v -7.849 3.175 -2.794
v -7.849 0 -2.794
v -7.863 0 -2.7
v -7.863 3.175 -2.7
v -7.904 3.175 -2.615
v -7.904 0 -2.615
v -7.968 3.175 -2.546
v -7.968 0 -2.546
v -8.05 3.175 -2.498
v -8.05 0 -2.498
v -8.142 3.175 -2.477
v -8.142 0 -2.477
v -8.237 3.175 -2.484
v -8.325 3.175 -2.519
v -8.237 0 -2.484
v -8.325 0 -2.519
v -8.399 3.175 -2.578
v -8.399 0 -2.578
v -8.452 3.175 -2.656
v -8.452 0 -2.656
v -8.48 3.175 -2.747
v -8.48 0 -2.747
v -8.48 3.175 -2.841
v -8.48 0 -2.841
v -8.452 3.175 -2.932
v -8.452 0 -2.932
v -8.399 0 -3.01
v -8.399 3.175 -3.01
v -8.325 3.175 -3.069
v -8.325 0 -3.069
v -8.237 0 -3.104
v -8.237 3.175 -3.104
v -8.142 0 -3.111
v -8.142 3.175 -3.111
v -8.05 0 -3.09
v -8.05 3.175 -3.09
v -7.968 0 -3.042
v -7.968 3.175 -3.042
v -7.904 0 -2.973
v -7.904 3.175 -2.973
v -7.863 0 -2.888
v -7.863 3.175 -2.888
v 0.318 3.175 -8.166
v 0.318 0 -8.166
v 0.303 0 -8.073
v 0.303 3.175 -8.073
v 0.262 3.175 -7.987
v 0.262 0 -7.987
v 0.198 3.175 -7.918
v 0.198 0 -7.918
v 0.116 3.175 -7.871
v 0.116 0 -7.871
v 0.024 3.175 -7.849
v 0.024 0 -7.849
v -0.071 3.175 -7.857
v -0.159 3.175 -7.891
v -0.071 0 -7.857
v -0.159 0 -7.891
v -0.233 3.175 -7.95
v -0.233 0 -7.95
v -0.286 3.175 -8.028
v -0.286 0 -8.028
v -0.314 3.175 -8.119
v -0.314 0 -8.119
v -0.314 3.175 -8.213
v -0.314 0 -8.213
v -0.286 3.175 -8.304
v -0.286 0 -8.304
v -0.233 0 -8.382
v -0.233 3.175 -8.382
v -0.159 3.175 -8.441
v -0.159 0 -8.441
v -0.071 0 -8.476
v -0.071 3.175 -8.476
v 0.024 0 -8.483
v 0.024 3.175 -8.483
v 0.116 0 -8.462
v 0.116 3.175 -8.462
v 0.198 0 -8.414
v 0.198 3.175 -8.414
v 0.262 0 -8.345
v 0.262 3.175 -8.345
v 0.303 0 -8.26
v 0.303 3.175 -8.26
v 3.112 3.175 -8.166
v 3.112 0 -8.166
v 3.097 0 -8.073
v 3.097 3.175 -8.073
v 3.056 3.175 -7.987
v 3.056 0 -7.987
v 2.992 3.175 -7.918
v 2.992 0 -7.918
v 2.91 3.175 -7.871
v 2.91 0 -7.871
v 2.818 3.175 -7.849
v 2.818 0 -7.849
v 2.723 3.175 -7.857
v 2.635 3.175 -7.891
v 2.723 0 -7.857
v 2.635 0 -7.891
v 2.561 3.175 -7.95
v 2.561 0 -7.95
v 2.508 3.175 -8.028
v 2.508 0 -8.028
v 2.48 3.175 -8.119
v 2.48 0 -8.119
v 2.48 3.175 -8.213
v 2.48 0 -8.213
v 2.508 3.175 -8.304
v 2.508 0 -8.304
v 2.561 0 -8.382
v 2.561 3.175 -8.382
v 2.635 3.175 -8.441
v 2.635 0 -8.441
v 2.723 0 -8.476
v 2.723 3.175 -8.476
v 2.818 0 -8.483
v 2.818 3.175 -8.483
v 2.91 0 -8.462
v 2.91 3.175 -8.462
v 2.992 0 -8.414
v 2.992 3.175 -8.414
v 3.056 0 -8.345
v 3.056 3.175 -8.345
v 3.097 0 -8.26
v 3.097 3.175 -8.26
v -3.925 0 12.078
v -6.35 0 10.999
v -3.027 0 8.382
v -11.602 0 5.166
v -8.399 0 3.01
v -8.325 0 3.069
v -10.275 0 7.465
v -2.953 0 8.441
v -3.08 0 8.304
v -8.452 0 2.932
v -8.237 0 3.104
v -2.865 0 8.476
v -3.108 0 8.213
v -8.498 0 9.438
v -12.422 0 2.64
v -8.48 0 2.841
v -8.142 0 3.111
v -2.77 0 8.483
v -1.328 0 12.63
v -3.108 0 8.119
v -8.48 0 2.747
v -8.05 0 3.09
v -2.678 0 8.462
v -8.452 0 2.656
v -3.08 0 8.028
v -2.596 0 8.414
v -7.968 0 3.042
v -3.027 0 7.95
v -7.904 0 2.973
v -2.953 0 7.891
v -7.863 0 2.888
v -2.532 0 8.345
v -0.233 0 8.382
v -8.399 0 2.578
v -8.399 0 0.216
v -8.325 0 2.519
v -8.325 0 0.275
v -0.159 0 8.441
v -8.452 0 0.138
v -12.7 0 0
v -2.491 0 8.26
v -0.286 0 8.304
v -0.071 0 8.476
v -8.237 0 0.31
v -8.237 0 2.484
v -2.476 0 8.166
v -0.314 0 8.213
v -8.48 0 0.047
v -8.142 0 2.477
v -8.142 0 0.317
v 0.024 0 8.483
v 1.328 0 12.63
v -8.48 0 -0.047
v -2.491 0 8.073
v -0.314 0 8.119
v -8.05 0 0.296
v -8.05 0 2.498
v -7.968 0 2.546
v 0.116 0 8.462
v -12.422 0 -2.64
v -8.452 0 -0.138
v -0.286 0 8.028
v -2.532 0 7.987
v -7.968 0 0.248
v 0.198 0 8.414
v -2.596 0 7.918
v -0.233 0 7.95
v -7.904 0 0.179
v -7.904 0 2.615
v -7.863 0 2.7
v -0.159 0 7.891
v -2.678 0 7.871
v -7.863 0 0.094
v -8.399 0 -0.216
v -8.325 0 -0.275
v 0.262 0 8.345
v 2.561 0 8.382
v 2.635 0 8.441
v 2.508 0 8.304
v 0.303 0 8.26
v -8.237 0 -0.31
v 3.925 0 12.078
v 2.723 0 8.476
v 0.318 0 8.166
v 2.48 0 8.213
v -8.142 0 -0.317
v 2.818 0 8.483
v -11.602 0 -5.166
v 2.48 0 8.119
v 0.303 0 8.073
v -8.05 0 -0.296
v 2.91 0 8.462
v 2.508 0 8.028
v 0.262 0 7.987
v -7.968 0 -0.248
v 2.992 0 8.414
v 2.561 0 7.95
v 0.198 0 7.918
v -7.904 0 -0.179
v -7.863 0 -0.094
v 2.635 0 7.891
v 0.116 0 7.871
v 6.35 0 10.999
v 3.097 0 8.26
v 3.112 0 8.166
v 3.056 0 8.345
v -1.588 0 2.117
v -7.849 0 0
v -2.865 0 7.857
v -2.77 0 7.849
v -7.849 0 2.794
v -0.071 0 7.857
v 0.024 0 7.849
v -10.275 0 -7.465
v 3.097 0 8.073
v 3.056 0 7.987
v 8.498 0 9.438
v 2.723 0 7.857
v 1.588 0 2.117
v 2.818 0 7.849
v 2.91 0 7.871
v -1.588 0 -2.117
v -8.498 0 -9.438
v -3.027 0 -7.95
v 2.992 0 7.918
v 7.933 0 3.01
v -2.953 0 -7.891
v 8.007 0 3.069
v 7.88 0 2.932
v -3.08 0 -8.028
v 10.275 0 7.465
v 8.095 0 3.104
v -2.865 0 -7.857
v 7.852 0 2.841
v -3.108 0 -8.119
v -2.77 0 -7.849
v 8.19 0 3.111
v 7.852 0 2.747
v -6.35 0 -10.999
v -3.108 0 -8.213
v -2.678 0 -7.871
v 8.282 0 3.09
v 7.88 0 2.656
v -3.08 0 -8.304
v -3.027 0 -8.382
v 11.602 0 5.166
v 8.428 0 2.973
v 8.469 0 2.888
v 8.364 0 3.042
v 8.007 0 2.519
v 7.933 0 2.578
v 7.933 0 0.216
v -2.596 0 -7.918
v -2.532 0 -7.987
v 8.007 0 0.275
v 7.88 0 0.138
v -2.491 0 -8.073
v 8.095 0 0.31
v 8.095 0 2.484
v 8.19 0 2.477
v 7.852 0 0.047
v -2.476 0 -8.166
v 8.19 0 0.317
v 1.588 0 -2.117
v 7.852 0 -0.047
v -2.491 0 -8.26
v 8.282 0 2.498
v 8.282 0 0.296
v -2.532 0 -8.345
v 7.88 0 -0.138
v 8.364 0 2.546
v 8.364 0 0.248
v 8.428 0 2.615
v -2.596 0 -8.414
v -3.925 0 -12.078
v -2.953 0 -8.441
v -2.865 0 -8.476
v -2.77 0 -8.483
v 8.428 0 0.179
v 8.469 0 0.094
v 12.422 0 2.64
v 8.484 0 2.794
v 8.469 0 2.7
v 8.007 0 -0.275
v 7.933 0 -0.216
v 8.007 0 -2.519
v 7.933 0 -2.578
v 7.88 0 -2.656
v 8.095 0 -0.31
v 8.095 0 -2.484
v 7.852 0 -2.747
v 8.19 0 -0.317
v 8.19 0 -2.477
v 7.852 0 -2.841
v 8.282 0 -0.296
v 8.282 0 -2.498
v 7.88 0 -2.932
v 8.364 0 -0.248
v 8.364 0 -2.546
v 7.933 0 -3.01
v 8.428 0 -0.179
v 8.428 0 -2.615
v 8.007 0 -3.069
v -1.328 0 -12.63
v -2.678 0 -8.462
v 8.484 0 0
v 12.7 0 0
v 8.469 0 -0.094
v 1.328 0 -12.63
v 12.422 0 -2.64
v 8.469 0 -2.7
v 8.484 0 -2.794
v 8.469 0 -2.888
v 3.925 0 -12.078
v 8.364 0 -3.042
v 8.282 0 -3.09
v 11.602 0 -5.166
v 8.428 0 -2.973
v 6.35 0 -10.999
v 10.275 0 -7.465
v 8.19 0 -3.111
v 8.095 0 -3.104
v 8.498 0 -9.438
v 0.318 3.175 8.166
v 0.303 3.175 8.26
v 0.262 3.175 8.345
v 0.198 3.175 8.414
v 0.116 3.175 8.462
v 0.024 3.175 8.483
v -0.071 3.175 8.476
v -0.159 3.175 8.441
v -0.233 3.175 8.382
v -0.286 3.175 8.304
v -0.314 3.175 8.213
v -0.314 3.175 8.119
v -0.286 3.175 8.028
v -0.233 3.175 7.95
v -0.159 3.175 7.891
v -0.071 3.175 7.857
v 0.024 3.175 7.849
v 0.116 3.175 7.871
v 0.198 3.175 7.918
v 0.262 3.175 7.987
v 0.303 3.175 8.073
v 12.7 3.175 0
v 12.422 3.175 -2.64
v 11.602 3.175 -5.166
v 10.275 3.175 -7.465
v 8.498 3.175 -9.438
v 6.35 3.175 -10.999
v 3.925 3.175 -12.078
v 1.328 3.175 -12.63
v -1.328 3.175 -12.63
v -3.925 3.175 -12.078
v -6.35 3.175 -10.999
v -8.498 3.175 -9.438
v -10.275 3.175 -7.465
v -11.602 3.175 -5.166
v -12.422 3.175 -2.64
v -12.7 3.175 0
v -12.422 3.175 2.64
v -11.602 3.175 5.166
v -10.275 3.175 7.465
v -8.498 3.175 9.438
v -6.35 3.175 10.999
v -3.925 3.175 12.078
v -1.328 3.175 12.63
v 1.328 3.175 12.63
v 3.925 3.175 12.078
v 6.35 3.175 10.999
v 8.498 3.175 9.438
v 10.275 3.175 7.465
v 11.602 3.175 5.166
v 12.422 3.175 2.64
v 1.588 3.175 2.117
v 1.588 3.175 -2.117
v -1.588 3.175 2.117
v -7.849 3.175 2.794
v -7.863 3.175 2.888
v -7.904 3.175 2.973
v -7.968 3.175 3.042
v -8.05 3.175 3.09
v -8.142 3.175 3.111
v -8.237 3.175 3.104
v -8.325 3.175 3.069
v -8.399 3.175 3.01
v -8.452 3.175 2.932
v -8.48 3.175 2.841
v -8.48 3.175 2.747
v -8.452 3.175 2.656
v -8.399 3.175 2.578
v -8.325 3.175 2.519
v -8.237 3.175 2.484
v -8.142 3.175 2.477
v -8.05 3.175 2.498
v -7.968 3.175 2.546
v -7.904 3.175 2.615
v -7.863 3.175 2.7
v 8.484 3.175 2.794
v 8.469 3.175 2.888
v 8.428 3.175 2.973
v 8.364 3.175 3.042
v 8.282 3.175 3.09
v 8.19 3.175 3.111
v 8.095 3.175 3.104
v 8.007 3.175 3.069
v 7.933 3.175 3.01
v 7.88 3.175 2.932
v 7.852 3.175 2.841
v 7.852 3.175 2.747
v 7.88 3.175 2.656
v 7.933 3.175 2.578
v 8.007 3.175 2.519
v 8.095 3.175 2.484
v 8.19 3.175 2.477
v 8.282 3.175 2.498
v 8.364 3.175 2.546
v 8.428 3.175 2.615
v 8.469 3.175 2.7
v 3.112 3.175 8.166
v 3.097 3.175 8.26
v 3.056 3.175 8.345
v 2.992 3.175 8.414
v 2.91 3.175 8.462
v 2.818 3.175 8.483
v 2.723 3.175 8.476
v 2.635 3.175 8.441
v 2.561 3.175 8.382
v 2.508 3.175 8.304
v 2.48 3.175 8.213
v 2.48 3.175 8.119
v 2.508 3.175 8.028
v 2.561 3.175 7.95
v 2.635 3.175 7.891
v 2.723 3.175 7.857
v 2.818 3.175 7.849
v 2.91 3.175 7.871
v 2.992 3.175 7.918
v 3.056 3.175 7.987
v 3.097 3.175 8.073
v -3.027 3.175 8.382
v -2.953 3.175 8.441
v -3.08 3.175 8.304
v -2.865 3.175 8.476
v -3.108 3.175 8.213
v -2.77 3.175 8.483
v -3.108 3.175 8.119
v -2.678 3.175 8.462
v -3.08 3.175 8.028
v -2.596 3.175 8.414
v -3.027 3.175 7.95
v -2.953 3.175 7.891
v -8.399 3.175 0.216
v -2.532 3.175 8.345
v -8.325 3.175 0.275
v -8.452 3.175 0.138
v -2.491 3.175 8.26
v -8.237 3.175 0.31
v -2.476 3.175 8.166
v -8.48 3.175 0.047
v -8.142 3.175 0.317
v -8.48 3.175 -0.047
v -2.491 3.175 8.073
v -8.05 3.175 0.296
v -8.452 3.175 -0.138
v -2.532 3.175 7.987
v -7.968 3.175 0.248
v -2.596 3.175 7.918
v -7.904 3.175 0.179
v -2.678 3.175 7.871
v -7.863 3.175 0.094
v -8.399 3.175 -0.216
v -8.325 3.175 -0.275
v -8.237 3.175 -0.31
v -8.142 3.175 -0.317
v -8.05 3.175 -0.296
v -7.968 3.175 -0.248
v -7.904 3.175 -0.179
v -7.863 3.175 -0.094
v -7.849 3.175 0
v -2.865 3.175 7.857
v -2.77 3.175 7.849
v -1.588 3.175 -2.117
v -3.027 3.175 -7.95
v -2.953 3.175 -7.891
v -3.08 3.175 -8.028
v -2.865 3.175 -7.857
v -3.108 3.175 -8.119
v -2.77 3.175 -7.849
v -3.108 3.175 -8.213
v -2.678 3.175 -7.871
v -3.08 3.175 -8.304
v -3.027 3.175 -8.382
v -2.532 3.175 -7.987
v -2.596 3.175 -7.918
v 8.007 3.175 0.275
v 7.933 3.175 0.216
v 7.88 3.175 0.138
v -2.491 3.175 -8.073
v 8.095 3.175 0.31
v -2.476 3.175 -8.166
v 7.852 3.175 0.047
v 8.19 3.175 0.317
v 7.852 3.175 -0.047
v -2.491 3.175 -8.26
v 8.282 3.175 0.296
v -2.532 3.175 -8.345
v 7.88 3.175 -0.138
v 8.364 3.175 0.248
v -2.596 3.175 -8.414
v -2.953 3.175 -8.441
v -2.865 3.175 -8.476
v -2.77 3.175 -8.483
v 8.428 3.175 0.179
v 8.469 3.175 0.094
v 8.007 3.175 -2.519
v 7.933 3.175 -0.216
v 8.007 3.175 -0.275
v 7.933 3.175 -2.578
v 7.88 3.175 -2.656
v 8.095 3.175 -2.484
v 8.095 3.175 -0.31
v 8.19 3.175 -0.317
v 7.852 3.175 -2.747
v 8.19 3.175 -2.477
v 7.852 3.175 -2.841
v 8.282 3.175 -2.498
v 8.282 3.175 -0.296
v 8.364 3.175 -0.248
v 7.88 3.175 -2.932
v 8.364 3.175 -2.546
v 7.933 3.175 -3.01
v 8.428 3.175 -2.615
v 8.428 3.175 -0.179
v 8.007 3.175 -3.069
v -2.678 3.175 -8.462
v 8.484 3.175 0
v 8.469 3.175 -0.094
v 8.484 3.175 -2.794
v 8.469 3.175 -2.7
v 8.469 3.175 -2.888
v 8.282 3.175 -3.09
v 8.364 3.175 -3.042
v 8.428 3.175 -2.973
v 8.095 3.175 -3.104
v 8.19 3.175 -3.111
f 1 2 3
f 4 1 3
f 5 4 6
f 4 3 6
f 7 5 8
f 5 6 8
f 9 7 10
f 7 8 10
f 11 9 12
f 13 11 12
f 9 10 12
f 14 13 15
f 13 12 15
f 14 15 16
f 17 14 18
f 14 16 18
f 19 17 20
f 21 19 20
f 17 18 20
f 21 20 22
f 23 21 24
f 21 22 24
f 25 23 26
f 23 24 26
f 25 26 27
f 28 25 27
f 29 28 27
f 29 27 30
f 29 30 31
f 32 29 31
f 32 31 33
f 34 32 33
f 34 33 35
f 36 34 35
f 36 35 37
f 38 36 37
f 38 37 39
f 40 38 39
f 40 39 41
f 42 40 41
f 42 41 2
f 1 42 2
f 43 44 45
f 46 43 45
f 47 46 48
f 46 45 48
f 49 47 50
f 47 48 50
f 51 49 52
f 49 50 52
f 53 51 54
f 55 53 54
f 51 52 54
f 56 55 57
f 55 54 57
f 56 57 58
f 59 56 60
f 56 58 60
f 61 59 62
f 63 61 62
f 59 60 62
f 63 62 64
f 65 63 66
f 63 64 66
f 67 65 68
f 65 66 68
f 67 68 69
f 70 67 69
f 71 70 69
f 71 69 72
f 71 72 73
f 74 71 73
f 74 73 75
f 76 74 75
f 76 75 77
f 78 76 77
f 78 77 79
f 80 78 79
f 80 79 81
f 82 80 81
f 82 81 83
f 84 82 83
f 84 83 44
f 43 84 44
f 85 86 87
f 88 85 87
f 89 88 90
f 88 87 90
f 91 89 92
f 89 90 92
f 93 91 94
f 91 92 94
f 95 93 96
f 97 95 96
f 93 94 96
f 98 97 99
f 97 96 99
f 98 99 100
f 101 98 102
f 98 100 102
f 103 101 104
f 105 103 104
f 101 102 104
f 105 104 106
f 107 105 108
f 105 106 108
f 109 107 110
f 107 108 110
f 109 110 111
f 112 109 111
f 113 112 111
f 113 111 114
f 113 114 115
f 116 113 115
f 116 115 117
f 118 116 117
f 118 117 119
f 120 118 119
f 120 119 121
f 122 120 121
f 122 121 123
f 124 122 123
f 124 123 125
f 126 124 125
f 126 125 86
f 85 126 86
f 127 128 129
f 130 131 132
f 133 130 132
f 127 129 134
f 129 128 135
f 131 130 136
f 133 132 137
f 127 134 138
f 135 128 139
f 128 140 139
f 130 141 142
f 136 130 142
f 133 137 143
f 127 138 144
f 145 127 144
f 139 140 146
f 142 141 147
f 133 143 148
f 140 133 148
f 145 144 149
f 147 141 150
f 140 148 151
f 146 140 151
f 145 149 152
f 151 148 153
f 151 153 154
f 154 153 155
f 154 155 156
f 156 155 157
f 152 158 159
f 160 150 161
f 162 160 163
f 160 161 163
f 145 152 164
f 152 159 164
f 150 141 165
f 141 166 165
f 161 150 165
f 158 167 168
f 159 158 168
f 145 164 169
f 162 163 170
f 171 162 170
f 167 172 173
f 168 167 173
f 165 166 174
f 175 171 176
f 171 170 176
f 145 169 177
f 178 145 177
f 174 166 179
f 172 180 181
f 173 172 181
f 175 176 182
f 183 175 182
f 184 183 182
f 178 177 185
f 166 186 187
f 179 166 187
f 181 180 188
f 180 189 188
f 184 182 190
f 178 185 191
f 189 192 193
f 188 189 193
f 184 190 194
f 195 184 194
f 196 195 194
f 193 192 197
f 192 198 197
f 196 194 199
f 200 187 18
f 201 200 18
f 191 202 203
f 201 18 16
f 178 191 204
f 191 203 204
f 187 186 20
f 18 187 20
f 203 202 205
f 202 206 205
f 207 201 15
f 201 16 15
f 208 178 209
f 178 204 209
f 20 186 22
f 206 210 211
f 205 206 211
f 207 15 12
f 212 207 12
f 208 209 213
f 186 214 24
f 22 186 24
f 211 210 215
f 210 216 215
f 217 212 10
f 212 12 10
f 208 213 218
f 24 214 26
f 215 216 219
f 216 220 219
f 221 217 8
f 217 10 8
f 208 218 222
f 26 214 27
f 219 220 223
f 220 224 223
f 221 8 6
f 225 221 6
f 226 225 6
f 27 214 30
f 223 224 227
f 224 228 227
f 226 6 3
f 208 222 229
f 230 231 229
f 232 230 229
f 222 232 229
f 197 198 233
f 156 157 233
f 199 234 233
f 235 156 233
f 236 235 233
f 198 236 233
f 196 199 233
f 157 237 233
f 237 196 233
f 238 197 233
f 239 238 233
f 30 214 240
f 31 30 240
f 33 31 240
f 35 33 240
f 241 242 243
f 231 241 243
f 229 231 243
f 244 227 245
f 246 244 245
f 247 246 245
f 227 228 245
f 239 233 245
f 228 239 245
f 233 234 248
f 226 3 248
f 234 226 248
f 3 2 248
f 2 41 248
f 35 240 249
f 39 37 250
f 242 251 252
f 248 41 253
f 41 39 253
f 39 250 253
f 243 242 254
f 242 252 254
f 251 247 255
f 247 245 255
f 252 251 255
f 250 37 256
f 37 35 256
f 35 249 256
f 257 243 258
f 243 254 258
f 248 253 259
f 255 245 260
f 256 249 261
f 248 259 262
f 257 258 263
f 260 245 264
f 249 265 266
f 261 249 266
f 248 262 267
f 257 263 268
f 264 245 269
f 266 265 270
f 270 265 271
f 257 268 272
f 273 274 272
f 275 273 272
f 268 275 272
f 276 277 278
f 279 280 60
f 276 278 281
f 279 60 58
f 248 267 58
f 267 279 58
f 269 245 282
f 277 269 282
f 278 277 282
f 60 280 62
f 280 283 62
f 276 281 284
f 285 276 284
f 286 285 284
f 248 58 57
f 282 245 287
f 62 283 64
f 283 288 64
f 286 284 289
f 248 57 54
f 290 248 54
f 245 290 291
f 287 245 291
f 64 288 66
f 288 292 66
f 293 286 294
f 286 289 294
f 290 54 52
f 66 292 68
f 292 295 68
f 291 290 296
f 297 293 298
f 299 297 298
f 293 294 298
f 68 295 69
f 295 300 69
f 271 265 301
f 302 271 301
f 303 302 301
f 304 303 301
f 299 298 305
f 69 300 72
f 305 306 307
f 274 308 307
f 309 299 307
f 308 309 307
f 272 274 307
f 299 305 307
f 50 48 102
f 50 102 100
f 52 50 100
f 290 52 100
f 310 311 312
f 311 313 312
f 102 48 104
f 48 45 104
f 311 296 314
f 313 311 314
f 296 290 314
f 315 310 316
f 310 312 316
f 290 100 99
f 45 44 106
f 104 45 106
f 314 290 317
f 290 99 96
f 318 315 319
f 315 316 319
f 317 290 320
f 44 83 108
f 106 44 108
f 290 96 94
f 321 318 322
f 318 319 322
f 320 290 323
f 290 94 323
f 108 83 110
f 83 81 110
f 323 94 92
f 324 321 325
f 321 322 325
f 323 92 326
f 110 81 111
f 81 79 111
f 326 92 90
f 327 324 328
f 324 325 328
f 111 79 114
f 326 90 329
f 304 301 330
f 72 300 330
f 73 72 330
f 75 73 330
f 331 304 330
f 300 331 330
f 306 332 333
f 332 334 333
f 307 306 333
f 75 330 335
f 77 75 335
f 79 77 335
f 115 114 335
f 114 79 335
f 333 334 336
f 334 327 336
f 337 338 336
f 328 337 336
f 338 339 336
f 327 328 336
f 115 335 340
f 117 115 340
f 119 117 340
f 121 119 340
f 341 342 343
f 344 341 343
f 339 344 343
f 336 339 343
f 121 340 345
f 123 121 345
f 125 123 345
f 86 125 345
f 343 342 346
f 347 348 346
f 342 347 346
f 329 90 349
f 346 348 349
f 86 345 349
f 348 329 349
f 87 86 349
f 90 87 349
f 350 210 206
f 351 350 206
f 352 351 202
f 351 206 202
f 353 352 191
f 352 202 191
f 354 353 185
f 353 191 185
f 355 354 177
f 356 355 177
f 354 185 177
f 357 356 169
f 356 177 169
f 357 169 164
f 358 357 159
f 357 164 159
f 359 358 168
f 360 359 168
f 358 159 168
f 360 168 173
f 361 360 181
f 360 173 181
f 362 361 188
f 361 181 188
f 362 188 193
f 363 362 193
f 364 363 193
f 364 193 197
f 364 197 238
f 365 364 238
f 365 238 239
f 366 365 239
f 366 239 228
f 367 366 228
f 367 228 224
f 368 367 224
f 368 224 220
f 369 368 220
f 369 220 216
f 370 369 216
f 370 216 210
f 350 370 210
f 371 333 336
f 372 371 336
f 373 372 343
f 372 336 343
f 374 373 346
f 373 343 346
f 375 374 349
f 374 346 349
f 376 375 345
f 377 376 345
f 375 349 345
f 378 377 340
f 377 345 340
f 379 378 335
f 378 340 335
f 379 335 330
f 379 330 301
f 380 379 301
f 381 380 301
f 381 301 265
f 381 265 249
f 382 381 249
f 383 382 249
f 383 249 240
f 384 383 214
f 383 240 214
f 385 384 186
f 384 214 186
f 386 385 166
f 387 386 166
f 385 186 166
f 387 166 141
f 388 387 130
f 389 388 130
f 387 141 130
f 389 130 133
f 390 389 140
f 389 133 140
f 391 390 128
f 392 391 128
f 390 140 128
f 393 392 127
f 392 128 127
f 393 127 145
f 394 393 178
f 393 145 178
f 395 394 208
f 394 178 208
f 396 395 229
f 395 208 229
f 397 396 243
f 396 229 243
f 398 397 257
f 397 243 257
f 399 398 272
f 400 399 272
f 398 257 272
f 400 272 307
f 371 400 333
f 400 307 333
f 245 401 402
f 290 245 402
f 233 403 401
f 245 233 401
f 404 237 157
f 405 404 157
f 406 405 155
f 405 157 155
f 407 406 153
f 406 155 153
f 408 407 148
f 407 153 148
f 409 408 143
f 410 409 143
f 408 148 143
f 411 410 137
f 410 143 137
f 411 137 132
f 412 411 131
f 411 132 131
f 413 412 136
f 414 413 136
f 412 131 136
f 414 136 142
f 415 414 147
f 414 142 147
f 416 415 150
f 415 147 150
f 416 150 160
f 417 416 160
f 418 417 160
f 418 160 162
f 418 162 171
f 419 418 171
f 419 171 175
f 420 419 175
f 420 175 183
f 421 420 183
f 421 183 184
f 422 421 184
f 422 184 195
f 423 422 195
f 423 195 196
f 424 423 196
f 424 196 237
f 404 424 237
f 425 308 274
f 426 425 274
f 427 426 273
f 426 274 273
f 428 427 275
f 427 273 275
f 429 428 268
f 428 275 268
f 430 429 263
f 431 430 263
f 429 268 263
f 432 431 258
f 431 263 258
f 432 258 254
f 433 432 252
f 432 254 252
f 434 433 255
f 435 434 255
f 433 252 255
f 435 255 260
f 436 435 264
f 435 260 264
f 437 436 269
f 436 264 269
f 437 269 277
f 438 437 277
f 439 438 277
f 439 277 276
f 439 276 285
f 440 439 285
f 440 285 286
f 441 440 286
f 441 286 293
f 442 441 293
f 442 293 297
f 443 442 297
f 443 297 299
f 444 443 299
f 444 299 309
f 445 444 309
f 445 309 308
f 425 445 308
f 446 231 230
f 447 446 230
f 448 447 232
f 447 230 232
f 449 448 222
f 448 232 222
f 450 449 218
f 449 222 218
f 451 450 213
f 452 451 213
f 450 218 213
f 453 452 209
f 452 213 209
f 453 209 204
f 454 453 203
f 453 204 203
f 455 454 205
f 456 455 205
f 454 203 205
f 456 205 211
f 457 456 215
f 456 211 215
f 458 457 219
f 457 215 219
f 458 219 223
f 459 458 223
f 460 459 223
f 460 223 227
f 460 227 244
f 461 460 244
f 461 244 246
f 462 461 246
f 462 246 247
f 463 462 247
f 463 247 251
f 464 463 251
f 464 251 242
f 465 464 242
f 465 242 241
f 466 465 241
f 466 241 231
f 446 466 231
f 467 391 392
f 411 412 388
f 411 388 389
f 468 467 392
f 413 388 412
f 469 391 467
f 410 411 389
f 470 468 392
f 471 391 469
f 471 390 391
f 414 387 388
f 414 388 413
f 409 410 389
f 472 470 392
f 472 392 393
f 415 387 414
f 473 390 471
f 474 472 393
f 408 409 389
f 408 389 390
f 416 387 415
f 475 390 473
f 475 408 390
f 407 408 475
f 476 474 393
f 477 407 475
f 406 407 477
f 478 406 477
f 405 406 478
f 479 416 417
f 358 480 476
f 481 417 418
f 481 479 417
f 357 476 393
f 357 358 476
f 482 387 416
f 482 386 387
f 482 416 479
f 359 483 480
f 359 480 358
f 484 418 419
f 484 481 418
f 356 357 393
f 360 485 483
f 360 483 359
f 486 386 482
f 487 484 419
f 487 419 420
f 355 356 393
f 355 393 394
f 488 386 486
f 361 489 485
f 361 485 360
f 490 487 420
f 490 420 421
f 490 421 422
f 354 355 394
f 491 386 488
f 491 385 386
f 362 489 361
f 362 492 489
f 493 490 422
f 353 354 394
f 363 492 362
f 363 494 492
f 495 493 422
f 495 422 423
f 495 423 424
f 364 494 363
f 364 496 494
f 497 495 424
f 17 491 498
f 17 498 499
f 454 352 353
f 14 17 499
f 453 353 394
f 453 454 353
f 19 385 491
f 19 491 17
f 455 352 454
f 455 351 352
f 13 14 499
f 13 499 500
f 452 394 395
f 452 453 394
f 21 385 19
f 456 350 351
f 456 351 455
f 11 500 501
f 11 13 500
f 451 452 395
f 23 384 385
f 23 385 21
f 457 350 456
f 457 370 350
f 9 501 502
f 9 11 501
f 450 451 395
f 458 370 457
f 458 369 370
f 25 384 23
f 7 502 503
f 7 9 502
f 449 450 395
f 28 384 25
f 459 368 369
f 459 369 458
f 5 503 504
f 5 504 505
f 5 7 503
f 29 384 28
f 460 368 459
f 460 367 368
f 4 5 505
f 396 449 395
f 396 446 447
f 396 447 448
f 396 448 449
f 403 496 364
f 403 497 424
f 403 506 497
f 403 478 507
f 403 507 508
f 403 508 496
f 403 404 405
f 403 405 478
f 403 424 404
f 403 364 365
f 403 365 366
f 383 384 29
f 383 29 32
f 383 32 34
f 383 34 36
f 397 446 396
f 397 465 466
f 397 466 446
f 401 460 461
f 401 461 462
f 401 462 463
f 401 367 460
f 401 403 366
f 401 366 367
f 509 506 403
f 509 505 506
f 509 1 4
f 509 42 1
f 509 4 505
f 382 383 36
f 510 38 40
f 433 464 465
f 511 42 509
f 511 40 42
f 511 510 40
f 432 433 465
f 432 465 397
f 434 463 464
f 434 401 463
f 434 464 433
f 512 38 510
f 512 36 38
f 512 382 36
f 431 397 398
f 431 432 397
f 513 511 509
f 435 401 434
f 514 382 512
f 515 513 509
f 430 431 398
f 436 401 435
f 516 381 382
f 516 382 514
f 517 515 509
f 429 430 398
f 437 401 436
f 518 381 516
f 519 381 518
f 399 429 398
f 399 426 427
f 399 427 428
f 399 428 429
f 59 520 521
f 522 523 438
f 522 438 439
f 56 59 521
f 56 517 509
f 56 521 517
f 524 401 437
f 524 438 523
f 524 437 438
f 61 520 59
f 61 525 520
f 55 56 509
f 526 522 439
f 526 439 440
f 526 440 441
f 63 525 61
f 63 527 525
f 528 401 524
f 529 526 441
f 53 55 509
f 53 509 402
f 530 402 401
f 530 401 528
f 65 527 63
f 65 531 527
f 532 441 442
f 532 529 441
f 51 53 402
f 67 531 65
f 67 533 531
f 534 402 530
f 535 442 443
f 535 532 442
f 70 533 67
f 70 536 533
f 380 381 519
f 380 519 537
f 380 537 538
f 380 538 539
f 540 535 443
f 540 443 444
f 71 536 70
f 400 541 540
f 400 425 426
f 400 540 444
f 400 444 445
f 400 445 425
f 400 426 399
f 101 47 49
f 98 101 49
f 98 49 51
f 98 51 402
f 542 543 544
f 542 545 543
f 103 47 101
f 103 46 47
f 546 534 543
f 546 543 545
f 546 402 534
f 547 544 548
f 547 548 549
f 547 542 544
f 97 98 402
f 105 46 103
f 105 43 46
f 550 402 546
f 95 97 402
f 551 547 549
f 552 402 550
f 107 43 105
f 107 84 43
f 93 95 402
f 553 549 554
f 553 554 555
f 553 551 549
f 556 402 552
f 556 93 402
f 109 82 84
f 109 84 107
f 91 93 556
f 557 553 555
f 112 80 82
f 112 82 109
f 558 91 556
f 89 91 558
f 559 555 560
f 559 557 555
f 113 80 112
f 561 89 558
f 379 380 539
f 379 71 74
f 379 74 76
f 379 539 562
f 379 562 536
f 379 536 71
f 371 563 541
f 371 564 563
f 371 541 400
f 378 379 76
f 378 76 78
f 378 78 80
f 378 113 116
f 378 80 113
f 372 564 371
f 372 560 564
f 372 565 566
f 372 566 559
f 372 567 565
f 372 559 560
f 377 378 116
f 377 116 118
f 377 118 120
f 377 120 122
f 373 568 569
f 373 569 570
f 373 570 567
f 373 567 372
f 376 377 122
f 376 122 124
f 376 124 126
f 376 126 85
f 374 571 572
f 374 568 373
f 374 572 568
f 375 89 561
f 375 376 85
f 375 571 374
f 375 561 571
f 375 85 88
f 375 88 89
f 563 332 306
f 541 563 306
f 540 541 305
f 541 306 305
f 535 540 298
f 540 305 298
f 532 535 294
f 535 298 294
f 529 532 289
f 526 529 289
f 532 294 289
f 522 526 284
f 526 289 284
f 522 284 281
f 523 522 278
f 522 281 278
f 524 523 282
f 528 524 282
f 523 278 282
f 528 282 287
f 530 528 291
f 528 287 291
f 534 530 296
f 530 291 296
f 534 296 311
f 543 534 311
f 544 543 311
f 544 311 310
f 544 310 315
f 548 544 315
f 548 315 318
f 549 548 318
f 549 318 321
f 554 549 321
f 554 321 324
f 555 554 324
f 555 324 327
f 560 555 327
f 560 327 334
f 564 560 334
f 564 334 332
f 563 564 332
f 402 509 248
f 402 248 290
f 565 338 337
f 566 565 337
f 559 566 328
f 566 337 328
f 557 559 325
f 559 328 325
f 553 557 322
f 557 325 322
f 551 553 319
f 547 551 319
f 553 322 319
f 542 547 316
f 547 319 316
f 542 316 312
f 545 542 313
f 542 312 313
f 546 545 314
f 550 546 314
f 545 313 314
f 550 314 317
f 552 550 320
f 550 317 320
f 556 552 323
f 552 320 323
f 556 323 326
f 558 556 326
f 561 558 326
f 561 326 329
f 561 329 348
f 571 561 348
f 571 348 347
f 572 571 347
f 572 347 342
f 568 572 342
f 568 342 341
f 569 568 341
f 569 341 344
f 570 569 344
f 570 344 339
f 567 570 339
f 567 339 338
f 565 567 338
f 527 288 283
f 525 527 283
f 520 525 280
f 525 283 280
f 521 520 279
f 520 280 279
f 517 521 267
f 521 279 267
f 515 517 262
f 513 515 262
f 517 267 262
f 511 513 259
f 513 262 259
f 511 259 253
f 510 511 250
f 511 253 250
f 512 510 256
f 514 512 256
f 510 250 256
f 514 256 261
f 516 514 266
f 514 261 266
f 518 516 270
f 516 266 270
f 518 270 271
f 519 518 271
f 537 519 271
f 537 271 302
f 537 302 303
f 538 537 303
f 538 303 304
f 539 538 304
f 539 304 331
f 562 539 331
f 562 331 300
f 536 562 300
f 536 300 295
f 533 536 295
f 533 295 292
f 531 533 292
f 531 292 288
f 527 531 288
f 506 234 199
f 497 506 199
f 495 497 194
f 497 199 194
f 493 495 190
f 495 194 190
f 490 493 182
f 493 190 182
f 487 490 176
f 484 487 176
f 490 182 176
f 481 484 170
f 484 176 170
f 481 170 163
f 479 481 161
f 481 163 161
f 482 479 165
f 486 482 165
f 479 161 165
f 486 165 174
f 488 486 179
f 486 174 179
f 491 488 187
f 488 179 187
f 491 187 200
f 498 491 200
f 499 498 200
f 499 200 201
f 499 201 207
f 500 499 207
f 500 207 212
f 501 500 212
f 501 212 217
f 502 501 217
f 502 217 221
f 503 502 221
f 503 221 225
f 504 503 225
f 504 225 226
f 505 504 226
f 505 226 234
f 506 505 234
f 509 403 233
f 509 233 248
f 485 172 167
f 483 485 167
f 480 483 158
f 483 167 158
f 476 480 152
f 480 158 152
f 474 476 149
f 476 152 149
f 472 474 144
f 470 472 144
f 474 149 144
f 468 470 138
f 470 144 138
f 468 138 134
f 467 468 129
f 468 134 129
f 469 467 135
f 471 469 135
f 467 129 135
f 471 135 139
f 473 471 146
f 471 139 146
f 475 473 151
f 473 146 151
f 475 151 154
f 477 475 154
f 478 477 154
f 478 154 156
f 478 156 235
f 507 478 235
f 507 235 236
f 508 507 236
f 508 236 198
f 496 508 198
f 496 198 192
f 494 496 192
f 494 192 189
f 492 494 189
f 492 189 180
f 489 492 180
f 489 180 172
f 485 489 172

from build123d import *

# Parameters (mm, degrees)
X_Z_SEVO_MOUNT_SKETCH_R            = 12.7
X_Z_SERVO_MOUNT_DEPTH              = 3.175
BASE_MOUNT_SKETCH_W                = 3.175
BASE_MOUNT_SKETCH_H                = 4.233333334
BASE_MOUNT_DEPTH                   = 4.175
SERVO_HORN_MOUNTING_HOLES_SKETCH_R = 0.3175
SERVO_HORN_MOUNT_HOLES_DEPTH       = 4.175


with BuildPart() as part:
    # X-Z Sevo Mount Sketch → X-Z Servo Mount (new body)
    with BuildSketch(Plane(origin=(0, 0, 0), x_dir=(1, 0, 0), z_dir=(0, 1, 0))):
        Circle(X_Z_SEVO_MOUNT_SKETCH_R)
    extrude(amount=X_Z_SERVO_MOUNT_DEPTH)

    # Base Mount Sketch → Base Mount (cut, through all)
    with BuildSketch(Plane(origin=(0, 3.175, 0), x_dir=(1, 0, 0), z_dir=(0, 1, 0))):
        Rectangle(BASE_MOUNT_SKETCH_W, BASE_MOUNT_SKETCH_H)
    extrude(amount=-BASE_MOUNT_DEPTH, mode=Mode.SUBTRACT)

    # Servo Horn Mounting Holes Sketch → Servo Horn Mount Holes (cut, through all)
    with BuildSketch(Plane.XZ):
        with Locations((0, 8.1661)):
            Circle(SERVO_HORN_MOUNTING_HOLES_SKETCH_R)
        with Locations((2.794, 8.1661)):
            Circle(SERVO_HORN_MOUNTING_HOLES_SKETCH_R)
        with Locations((-2.794, 8.1661)):
            Circle(SERVO_HORN_MOUNTING_HOLES_SKETCH_R)
        with Locations((2.794, -8.1661)):
            Circle(SERVO_HORN_MOUNTING_HOLES_SKETCH_R)
        with Locations((0, -8.1661)):
            Circle(SERVO_HORN_MOUNTING_HOLES_SKETCH_R)
        with Locations((-2.794, -8.1661)):
            Circle(SERVO_HORN_MOUNTING_HOLES_SKETCH_R)
        with Locations((8.1661, 0)):
            Circle(SERVO_HORN_MOUNTING_HOLES_SKETCH_R)
        with Locations((8.1661, 2.794)):
            Circle(SERVO_HORN_MOUNTING_HOLES_SKETCH_R)
        with Locations((8.1661, -2.794)):
            Circle(SERVO_HORN_MOUNTING_HOLES_SKETCH_R)
        with Locations((-8.1661, -2.794)):
            Circle(SERVO_HORN_MOUNTING_HOLES_SKETCH_R)
        with Locations((-8.1661, 2.794)):
            Circle(SERVO_HORN_MOUNTING_HOLES_SKETCH_R)
        with Locations((-8.1661, 0)):
            Circle(SERVO_HORN_MOUNTING_HOLES_SKETCH_R)
    extrude(amount=-SERVO_HORN_MOUNT_HOLES_DEPTH, mode=Mode.SUBTRACT)


solid = part.part
